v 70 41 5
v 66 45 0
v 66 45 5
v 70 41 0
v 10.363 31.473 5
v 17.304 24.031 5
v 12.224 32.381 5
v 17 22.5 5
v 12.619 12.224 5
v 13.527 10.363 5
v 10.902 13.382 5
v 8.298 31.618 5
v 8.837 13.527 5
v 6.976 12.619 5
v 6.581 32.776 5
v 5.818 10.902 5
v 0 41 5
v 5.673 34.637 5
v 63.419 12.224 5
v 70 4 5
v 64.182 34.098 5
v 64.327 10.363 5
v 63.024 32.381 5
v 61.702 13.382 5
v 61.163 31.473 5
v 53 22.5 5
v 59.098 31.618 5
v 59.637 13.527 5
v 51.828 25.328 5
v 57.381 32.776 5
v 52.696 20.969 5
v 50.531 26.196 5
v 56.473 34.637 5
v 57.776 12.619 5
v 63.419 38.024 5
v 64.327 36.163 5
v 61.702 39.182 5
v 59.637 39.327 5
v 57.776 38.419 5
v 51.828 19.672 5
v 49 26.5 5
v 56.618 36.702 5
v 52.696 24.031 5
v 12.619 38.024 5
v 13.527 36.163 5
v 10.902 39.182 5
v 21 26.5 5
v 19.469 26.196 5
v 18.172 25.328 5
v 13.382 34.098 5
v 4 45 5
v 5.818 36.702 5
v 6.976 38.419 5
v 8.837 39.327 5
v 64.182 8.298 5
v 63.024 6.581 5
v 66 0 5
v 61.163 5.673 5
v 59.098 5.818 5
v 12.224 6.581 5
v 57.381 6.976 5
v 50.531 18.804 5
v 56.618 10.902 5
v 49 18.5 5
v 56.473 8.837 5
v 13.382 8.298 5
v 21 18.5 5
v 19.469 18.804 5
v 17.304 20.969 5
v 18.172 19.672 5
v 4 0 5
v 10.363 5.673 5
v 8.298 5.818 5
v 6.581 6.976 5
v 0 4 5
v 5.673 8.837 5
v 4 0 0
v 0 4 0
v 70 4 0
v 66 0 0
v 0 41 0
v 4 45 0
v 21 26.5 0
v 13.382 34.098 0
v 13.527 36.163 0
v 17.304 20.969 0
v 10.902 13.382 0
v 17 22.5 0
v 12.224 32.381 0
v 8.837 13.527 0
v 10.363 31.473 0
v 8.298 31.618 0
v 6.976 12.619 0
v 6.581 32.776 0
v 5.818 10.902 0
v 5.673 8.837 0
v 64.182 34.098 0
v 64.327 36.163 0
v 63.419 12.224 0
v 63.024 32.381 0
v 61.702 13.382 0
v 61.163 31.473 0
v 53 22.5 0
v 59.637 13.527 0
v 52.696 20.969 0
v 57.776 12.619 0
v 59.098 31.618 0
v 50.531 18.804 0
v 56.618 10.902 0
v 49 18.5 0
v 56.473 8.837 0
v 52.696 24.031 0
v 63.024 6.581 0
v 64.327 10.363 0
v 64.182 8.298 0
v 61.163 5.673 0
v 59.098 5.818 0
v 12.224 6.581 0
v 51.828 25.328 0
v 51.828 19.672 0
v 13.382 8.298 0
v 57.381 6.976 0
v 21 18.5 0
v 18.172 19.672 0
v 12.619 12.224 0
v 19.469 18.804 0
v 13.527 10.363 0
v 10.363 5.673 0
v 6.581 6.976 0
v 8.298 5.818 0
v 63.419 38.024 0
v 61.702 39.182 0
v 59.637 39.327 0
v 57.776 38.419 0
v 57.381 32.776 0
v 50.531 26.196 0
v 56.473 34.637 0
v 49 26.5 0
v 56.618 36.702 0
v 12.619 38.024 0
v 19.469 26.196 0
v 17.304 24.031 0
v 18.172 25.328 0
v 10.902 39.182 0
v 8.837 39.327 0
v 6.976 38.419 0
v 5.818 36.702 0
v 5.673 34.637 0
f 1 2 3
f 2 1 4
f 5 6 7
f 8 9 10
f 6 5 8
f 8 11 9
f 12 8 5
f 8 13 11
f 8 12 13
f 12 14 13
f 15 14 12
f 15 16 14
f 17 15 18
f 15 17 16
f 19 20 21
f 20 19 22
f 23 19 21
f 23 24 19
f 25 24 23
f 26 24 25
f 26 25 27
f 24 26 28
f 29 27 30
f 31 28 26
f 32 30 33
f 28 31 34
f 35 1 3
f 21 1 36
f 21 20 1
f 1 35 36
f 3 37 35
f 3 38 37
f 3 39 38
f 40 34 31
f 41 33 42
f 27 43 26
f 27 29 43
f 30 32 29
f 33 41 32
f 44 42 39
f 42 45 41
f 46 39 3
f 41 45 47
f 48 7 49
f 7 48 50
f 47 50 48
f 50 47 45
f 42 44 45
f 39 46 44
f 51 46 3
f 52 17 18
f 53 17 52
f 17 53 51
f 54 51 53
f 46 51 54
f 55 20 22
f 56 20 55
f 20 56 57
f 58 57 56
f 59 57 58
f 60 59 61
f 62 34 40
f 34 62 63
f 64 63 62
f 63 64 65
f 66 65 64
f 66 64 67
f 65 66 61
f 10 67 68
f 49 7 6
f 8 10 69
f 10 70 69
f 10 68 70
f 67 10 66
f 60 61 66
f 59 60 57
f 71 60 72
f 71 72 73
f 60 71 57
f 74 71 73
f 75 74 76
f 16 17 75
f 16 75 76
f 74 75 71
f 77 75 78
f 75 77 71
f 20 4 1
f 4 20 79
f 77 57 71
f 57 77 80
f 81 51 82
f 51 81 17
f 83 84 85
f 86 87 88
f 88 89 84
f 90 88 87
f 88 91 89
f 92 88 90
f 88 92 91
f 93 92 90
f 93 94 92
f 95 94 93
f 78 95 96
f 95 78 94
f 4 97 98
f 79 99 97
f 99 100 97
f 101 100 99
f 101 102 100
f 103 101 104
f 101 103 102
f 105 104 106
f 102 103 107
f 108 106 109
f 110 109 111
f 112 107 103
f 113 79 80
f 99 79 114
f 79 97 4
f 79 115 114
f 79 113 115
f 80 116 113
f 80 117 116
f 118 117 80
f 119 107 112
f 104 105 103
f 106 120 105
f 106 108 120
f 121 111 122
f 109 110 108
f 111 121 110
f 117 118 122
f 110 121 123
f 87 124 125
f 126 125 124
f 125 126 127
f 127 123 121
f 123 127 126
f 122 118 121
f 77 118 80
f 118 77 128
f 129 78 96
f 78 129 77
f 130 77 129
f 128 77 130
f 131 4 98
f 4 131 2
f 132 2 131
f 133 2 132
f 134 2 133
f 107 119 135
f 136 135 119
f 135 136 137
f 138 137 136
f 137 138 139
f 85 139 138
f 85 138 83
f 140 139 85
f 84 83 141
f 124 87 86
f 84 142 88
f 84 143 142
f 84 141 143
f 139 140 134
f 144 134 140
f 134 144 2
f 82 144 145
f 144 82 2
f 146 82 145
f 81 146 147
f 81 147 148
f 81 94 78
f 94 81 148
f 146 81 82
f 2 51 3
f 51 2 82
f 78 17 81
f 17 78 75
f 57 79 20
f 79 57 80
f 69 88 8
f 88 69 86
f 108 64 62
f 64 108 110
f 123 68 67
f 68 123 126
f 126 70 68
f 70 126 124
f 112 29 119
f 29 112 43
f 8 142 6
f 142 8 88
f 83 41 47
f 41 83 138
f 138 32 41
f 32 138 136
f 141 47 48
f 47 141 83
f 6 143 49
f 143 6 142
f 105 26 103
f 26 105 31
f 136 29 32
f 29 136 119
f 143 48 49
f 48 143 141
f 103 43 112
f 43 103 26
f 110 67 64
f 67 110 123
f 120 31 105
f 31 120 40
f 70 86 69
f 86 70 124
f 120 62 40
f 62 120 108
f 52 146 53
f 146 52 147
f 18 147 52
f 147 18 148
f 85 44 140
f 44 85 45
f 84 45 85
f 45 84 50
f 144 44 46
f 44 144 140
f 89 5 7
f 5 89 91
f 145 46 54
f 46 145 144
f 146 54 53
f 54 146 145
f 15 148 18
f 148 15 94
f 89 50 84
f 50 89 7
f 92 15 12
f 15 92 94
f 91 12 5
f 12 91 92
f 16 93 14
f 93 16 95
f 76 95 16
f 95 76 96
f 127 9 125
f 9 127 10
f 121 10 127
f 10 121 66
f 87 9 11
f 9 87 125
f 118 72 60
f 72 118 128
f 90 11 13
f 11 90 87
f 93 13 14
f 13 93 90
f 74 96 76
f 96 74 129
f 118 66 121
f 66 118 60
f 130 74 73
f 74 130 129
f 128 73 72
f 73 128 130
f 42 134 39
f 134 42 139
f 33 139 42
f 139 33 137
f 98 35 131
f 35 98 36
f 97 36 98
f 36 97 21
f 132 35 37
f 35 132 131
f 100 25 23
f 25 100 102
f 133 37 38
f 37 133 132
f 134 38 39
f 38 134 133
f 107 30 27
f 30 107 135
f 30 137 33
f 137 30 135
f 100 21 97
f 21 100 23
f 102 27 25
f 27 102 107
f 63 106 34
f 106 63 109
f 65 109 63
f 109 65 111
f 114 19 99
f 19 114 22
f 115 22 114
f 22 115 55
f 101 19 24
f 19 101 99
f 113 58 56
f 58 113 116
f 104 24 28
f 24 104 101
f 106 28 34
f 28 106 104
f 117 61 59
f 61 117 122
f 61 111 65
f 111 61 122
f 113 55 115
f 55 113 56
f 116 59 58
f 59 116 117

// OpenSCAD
$fn = 32;

// ----------------------------------------------------------------------
// Bracket plate: slot plate 70 x 45
// ----------------------------------------------------------------------

// --- parameters (mm) ---
hole_r = 4;               // bolt hole radius
plate_t = 5;              // plate thickness, Z (extrusion height)
plate_l = 70;             // plate length
plate_w = 45;             // plate width
slot_l = 28;              // slot straight length
slot_r = 4;               // slot end radius

slot_len = slot_l + 2 * slot_r;
slot_w = 2 * slot_r;
hole_d2 = 2 * hole_r;

profile = [[4, 0], [66, 0], [70, 4], [70, 41], [66, 45], [4, 45], [0, 41], [0, 4]];  // primary outline, 8 points, counter clockwise
void_1 = [[49, 18.5], [50.531, 18.804], [51.828, 19.672], [52.696, 20.969], [53, 22.5], [52.696, 24.031], [51.828, 25.328], [50.531, 26.196], [49, 26.5], [21, 26.5], [19.469, 26.196], [18.172, 25.328], [17.304, 24.031], [17, 22.5], [17.304, 20.969], [18.172, 19.672], [19.469, 18.804], [21, 18.5]];  // grip slot, 18 points
void_2 = [[13.527, 36.163], [12.619, 38.024], [10.902, 39.182], [8.837, 39.327], [6.976, 38.419], [5.818, 36.702], [5.673, 34.637], [6.581, 32.776], [8.298, 31.618], [10.363, 31.473], [12.224, 32.381], [13.382, 34.098]];  // corner hole, 12 points
void_3 = [[13.527, 10.363], [12.619, 12.224], [10.902, 13.382], [8.837, 13.527], [6.976, 12.619], [5.818, 10.902], [5.673, 8.837], [6.581, 6.976], [8.298, 5.818], [10.363, 5.673], [12.224, 6.581], [13.382, 8.298]];  // corner hole, 12 points
void_4 = [[64.327, 36.163], [63.419, 38.024], [61.702, 39.182], [59.637, 39.327], [57.776, 38.419], [56.618, 36.702], [56.473, 34.637], [57.381, 32.776], [59.098, 31.618], [61.163, 31.473], [63.024, 32.381], [64.182, 34.098]];  // corner hole, 12 points
void_5 = [[64.327, 10.363], [63.419, 12.224], [61.702, 13.382], [59.637, 13.527], [57.776, 12.619], [56.618, 10.902], [56.473, 8.837], [57.381, 6.976], [59.098, 5.818], [61.163, 5.673], [63.024, 6.581], [64.182, 8.298]];  // corner hole, 12 points

// --- the one profile operation ---
difference() {
  linear_extrude(height = plate_t) polygon(points = profile);
  translate([0, 0, -1])
    linear_extrude(height = plate_t + 2) polygon(points = void_1);
  translate([0, 0, -1])
    linear_extrude(height = plate_t + 2) polygon(points = void_2);
  translate([0, 0, -1])
    linear_extrude(height = plate_t + 2) polygon(points = void_3);
  translate([0, 0, -1])
    linear_extrude(height = plate_t + 2) polygon(points = void_4);
  translate([0, 0, -1])
    linear_extrude(height = plate_t + 2) polygon(points = void_5);
}
